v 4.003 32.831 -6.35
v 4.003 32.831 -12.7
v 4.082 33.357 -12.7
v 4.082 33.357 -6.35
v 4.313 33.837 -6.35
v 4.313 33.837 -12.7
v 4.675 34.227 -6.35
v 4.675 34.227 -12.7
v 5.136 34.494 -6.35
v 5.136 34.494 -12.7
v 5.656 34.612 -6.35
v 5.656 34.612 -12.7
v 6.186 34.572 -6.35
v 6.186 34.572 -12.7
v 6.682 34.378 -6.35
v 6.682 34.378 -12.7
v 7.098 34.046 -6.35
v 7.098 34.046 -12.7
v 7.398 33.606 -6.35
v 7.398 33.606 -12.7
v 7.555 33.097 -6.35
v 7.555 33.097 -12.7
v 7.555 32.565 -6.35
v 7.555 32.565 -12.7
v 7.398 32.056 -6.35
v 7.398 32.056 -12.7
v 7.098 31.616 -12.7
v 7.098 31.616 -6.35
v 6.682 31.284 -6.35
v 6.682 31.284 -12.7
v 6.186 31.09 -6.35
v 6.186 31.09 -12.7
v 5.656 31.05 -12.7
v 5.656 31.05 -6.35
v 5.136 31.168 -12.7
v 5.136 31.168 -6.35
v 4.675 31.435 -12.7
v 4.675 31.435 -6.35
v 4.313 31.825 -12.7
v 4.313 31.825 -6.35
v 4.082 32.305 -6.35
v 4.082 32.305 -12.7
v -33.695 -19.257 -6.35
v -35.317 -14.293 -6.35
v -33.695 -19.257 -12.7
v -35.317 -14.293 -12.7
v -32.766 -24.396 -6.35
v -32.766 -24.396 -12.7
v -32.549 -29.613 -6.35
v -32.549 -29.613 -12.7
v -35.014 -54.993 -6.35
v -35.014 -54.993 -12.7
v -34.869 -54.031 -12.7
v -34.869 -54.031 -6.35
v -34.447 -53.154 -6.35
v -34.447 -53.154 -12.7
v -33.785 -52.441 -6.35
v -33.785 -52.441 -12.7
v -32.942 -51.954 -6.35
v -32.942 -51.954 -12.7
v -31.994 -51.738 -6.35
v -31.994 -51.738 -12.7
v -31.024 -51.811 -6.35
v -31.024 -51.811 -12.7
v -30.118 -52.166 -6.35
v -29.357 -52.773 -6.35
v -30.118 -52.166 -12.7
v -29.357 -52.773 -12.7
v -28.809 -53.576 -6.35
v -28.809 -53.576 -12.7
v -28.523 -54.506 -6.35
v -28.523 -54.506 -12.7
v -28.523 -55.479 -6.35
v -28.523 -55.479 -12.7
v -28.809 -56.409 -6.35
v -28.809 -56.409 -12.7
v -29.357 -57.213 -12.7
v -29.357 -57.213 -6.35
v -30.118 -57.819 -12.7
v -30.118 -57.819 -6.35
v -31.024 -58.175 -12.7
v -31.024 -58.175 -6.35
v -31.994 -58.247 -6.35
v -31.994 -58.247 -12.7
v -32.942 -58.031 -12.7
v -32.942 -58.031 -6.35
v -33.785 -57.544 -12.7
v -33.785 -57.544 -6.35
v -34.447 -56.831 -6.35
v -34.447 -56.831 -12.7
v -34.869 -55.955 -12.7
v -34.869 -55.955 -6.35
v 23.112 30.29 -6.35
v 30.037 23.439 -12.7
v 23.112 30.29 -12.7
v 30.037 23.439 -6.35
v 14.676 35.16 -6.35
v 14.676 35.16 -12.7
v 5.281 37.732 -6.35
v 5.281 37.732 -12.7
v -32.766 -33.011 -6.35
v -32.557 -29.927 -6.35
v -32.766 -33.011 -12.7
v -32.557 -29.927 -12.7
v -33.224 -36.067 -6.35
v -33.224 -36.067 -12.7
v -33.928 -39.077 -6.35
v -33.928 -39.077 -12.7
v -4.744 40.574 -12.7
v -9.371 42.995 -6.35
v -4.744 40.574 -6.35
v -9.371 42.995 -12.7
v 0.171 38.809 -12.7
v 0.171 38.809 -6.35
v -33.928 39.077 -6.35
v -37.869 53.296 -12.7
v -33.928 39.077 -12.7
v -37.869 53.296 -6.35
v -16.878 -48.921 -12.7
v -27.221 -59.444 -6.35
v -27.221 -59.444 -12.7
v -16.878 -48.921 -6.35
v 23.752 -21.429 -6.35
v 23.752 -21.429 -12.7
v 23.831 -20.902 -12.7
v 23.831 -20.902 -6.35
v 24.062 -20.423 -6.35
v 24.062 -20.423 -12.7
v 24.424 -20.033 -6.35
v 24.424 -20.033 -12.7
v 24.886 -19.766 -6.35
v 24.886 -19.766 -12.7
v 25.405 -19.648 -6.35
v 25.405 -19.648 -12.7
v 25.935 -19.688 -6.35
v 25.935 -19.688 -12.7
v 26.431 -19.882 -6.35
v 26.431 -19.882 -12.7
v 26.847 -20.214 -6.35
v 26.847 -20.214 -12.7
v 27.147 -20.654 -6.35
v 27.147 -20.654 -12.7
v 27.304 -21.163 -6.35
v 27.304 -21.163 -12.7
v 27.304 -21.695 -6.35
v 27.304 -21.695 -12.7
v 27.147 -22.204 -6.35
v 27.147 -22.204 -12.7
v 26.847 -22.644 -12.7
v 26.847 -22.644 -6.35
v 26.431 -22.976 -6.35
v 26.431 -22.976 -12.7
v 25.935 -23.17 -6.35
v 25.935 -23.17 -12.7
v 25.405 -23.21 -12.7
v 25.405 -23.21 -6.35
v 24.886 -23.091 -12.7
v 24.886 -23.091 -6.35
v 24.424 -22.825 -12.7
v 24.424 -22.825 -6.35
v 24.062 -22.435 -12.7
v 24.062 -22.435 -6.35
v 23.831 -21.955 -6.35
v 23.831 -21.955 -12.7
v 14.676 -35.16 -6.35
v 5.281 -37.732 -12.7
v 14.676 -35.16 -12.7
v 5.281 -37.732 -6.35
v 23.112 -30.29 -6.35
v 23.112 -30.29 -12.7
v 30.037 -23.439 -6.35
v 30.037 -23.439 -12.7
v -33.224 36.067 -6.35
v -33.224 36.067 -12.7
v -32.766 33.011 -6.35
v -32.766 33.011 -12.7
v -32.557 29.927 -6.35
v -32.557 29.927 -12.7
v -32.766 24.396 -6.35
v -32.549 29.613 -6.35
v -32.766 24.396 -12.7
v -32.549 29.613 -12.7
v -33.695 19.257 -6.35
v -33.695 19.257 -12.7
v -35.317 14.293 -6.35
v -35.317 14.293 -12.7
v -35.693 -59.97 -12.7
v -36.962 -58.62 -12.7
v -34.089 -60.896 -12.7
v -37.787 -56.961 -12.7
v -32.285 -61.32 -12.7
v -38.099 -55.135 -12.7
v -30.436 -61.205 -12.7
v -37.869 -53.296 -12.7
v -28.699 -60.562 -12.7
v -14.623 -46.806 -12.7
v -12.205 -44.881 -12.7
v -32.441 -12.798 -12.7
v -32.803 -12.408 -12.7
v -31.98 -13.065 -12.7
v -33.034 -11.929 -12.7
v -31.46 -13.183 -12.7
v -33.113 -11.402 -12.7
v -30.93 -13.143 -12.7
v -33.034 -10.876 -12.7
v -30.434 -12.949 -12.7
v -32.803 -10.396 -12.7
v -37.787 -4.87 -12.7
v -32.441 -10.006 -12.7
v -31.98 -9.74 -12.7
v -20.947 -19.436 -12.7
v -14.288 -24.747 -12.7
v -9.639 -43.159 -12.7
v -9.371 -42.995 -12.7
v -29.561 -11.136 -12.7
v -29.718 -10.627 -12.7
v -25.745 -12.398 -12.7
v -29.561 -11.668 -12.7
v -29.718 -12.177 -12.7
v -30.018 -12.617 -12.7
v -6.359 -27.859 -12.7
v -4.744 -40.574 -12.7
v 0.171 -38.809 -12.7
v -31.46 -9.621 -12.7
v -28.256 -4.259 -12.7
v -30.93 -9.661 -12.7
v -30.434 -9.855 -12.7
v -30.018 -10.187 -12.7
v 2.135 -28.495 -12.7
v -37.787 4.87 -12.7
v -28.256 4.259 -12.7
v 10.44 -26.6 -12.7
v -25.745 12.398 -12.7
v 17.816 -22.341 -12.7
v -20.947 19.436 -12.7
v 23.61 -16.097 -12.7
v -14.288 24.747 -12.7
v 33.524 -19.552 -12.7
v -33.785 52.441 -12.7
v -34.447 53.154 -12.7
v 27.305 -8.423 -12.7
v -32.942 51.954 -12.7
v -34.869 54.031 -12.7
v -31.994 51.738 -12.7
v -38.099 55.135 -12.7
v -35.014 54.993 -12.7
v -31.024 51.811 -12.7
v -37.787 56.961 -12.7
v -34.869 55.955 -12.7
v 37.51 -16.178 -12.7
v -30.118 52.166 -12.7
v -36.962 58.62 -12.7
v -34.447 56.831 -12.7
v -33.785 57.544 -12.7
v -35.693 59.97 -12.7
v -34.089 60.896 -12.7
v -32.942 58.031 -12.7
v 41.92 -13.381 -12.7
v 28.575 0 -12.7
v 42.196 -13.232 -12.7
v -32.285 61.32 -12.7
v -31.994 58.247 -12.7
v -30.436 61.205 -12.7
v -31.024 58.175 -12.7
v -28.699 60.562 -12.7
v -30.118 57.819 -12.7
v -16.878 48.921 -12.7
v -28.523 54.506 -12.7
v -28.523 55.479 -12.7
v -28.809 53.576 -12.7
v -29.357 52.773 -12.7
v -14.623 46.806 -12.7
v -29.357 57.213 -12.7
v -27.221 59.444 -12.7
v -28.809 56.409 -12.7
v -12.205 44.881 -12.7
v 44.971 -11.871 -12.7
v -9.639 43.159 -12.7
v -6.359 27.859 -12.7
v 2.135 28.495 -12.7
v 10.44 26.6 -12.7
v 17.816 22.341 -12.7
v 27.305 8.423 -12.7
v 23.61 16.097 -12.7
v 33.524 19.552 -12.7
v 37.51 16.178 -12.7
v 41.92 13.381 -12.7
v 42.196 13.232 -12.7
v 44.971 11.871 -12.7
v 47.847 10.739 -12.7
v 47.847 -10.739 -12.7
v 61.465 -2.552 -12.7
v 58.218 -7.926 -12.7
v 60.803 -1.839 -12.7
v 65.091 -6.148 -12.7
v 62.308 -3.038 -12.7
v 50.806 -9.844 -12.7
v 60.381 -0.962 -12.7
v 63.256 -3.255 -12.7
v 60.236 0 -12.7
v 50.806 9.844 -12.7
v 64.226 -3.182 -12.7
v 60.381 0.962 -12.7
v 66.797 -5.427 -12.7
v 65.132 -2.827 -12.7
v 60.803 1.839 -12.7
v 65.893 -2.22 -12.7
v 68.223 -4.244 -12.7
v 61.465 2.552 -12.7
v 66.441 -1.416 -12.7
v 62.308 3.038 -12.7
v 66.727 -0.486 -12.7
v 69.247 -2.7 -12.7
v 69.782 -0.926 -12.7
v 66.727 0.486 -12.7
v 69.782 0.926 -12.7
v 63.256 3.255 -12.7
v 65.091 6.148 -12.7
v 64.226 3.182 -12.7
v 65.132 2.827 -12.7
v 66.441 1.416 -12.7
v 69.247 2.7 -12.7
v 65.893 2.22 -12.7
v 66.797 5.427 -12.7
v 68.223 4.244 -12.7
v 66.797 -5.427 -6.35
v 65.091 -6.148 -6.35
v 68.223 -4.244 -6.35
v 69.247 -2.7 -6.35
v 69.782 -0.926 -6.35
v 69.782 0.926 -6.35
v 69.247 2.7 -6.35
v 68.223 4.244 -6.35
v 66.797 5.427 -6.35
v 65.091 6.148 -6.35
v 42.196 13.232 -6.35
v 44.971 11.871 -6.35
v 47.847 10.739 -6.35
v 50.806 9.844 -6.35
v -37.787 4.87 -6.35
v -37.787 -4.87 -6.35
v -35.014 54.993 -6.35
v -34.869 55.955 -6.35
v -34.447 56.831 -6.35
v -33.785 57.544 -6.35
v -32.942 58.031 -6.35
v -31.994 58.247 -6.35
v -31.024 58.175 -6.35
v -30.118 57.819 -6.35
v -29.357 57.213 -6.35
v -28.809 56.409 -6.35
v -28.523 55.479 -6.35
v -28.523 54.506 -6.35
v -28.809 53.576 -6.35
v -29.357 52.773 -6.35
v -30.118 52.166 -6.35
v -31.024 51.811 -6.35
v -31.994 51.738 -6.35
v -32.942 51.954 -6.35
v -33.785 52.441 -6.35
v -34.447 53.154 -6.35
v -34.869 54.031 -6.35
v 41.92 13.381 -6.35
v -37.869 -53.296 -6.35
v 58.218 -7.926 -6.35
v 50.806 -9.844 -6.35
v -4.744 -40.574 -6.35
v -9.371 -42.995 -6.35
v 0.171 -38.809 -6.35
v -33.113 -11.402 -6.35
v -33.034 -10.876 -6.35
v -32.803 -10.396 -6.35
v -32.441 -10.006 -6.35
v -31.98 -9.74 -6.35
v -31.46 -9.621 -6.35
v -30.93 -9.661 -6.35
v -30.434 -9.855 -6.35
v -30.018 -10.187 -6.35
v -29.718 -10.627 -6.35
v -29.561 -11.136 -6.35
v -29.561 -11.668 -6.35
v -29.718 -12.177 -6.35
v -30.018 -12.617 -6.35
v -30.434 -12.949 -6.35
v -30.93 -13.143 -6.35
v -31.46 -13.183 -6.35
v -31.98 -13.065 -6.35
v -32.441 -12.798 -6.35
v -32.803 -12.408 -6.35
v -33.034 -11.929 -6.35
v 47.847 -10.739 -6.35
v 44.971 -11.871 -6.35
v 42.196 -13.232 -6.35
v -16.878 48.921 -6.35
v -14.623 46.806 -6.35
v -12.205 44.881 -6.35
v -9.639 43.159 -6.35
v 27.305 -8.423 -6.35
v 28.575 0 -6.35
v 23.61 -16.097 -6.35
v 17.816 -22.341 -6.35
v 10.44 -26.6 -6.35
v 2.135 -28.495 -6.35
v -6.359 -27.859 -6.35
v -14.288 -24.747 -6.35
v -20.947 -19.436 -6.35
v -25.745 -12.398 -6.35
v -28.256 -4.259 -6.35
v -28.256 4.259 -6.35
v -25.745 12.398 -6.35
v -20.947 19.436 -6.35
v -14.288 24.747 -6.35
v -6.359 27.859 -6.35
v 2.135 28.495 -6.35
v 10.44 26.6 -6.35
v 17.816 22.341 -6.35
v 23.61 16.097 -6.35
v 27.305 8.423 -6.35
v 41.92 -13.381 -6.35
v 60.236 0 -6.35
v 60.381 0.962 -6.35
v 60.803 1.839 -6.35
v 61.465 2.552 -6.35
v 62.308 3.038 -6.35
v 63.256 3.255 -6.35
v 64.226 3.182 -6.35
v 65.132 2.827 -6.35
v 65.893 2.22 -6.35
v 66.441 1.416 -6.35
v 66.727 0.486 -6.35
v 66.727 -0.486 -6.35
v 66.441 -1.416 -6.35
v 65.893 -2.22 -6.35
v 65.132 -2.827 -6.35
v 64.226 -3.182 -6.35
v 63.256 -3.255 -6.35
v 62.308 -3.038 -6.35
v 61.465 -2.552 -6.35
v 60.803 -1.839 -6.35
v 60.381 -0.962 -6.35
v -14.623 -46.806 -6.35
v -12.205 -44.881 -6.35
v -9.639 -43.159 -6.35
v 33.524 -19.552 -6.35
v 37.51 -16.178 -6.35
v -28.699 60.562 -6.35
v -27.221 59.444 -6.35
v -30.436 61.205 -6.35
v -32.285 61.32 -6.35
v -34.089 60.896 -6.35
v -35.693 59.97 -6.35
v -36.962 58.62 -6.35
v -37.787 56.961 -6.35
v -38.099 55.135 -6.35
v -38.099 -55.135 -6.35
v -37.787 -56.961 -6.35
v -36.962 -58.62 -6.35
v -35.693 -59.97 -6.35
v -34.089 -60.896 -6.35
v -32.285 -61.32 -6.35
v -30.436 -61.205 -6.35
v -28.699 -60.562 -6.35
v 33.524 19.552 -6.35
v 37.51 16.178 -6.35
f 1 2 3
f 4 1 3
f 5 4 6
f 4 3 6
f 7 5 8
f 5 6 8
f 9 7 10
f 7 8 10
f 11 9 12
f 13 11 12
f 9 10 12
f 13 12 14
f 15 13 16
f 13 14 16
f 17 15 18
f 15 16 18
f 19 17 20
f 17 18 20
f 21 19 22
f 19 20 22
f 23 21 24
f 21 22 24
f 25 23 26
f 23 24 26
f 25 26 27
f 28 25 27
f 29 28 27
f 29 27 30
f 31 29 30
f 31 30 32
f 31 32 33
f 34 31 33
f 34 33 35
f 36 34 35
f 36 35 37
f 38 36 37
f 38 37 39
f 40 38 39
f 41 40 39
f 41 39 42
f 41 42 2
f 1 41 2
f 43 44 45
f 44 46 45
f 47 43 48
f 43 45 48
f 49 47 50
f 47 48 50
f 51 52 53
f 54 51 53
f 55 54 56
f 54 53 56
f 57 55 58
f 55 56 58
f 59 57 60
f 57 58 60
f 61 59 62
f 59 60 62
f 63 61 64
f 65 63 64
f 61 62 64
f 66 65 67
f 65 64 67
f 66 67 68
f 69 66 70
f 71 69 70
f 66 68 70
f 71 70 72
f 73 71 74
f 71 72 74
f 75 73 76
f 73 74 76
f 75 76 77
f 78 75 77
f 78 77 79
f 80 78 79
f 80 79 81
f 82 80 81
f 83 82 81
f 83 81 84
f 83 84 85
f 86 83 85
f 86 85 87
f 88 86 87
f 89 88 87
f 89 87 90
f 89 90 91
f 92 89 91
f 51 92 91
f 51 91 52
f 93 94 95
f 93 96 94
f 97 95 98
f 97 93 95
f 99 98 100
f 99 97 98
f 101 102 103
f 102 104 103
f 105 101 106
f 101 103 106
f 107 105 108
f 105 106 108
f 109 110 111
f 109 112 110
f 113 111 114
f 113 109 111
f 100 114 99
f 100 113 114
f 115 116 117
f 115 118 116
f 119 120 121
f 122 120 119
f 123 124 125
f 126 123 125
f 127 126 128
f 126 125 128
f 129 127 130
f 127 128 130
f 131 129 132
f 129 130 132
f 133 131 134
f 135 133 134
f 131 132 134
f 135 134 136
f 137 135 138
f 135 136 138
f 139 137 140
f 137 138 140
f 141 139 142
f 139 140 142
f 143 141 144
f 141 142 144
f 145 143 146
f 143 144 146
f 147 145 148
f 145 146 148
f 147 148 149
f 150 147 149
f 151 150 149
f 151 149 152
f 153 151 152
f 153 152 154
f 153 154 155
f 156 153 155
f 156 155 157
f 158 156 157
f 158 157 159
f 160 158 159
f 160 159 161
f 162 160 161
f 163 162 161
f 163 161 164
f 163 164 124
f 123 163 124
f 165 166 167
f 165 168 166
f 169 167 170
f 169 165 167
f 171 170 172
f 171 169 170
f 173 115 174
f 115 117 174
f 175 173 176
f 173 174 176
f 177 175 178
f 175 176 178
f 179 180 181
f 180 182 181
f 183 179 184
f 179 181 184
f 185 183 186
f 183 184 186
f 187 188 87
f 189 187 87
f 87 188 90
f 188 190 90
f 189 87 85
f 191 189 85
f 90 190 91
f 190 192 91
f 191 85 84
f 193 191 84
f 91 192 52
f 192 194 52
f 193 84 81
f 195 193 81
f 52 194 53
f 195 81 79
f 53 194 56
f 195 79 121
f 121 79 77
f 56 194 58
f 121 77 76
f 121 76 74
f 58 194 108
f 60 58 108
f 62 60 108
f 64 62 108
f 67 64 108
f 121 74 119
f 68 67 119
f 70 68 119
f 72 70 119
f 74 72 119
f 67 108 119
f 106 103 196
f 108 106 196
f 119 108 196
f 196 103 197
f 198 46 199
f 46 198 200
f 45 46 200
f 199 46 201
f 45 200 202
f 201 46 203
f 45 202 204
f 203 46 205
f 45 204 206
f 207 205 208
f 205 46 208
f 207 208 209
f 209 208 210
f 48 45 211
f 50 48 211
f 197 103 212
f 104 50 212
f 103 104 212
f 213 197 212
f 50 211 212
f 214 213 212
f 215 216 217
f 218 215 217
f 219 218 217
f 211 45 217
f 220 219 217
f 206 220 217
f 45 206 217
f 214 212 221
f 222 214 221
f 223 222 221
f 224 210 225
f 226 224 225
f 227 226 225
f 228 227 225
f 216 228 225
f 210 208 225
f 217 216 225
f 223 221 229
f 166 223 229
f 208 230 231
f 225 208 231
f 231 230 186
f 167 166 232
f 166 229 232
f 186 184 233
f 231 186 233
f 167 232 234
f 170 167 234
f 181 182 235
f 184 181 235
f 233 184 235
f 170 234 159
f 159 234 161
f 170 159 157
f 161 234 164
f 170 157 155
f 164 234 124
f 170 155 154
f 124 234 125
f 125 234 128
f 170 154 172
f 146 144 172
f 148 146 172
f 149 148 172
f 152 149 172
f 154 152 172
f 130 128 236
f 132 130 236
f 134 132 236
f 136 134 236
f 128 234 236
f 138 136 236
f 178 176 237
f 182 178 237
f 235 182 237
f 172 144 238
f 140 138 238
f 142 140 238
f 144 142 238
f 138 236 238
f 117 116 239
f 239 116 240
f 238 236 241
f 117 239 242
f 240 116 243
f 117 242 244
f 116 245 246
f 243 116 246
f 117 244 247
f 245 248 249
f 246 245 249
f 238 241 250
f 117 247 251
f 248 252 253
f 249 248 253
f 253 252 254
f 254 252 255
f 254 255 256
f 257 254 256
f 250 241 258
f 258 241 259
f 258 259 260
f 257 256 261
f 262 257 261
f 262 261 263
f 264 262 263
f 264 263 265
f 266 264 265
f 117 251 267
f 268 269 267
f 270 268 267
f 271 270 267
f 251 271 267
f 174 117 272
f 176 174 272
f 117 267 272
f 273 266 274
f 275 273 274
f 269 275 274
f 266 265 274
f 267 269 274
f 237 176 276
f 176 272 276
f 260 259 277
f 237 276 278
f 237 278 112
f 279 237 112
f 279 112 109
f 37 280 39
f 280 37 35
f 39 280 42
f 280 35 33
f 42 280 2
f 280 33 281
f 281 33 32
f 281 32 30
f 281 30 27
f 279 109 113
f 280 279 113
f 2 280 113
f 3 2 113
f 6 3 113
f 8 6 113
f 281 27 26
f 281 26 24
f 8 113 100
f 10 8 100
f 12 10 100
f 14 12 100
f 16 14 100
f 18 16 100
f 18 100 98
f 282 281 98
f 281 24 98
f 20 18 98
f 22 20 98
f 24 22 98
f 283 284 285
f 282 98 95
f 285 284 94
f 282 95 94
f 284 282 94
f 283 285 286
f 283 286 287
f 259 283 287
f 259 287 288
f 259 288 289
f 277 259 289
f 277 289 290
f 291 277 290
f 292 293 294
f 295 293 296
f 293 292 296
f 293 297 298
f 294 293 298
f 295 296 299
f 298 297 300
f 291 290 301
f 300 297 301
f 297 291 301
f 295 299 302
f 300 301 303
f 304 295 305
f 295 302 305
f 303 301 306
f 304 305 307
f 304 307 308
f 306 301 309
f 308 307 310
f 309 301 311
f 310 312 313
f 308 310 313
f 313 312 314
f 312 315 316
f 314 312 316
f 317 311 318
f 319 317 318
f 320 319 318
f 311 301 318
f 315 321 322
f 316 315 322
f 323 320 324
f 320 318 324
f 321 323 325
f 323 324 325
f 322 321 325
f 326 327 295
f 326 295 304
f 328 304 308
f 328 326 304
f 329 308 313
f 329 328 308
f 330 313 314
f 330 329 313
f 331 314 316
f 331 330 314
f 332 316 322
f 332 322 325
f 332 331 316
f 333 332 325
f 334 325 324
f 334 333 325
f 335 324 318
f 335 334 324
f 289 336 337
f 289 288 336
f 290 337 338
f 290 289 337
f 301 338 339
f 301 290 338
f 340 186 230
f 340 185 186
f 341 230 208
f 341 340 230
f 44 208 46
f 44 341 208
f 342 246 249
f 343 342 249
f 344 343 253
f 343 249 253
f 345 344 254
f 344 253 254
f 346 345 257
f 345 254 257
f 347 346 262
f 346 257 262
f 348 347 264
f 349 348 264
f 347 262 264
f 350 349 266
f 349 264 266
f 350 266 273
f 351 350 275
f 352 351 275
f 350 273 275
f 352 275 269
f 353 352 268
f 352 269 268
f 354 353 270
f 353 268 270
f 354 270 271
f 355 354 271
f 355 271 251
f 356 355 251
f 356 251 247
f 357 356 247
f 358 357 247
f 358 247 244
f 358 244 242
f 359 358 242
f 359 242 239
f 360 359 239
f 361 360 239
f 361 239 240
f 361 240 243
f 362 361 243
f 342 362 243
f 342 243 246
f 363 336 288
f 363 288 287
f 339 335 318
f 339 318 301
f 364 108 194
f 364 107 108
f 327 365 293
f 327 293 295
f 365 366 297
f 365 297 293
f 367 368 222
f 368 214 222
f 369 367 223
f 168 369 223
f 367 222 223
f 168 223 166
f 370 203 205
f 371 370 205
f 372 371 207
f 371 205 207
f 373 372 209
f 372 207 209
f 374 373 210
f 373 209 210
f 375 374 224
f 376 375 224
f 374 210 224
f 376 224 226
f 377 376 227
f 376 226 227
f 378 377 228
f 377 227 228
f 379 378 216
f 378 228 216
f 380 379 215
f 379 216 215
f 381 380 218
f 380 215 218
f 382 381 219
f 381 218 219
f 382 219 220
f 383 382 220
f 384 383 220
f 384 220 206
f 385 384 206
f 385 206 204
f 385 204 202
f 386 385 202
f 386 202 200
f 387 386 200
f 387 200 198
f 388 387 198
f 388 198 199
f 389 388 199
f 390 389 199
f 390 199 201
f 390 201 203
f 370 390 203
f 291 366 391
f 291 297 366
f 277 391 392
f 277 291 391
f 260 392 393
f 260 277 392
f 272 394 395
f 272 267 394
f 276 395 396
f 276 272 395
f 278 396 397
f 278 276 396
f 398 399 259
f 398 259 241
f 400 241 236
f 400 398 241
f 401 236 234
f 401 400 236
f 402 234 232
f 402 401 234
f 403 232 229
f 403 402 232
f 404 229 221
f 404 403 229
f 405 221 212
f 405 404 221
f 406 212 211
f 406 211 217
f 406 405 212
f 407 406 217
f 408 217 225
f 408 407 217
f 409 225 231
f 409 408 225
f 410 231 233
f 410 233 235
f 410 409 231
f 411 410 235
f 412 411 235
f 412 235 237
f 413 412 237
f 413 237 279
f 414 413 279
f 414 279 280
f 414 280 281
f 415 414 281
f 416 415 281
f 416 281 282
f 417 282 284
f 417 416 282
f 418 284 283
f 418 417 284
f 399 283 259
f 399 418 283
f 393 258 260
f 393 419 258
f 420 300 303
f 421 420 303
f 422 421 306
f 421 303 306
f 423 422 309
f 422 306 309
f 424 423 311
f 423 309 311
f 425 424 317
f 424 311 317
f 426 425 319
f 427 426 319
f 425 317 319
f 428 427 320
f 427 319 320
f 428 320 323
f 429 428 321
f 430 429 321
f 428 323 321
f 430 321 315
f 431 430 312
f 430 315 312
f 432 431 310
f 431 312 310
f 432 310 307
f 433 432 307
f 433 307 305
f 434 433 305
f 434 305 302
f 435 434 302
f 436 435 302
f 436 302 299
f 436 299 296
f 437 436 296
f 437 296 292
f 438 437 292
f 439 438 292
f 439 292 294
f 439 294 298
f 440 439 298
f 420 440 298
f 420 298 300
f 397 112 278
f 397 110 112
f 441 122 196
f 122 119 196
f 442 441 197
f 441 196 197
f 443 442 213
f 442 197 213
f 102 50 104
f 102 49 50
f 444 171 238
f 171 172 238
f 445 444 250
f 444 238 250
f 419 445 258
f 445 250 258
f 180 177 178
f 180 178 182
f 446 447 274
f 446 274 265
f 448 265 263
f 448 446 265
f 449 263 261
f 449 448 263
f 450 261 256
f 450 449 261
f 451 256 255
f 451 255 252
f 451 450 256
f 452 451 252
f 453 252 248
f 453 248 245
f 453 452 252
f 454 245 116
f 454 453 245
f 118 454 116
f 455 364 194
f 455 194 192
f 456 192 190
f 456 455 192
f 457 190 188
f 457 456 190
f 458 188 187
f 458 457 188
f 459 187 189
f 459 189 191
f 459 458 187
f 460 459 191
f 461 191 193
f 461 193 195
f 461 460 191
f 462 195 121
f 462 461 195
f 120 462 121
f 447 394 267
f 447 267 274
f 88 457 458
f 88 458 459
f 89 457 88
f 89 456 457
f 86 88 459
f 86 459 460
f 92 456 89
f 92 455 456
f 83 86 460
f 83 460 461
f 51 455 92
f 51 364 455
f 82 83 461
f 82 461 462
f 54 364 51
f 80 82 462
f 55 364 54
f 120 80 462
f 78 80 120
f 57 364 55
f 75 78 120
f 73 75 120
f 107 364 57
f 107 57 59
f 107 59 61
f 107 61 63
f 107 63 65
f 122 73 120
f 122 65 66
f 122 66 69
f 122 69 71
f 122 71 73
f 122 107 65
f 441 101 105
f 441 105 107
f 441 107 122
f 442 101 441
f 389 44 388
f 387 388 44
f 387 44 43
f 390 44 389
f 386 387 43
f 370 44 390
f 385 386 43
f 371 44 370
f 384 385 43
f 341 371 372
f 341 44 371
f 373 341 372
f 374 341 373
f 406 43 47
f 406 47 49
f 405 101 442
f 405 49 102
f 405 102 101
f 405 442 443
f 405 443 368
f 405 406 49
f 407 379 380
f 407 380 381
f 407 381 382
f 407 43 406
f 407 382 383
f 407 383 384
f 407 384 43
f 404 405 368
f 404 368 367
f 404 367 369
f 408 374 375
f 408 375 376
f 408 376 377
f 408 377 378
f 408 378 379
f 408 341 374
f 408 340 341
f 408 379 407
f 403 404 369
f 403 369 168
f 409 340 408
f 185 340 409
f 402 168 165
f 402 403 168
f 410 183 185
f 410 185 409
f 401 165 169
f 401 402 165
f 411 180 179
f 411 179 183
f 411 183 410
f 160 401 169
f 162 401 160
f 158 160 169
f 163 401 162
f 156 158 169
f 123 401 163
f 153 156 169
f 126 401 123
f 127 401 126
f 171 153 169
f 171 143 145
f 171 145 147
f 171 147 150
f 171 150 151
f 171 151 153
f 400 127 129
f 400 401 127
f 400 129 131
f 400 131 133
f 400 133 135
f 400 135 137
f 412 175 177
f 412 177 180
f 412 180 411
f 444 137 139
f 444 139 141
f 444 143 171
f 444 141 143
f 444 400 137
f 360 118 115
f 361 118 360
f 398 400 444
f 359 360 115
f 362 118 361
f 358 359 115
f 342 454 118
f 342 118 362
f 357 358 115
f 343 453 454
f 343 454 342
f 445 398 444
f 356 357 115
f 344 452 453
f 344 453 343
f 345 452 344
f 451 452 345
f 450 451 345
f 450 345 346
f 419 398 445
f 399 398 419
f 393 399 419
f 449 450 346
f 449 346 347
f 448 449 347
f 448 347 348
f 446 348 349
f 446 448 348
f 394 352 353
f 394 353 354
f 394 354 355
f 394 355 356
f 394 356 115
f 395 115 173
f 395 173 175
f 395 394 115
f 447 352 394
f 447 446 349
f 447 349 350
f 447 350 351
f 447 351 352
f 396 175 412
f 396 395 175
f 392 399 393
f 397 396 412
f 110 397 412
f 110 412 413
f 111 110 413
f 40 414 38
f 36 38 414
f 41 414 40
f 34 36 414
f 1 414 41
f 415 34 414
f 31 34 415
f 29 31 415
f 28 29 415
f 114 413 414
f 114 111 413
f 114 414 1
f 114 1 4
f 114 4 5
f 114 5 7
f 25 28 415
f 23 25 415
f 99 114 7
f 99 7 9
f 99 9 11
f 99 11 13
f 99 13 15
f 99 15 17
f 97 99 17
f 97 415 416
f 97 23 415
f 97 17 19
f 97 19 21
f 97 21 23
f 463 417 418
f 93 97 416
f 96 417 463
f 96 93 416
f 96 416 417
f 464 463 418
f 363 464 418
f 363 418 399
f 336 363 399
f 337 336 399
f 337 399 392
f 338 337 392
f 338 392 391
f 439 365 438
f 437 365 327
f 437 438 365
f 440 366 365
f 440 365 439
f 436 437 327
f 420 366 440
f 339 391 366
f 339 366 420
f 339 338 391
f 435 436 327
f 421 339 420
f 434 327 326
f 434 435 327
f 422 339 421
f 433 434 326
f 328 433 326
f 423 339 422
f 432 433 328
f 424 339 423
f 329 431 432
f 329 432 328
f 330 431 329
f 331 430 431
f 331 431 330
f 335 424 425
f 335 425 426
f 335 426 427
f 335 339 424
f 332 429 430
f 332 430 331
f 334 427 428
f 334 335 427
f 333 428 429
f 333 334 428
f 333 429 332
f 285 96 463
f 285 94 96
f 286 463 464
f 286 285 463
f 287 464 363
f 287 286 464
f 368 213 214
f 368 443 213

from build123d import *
from build123d.topology import SkipClean

# Parameters (mm, degrees)
BOSS_EXTRUDE1_DEPTH      = 6.35
BOSS_EXTRUDE1_DEPTH_BACK = 6.35
BOSS_EXTRUDE2_START      = -12.7
BOSS_EXTRUDE2_DEPTH      = 12.7
SKETCH4_R                = 28.575
CUT_EXTRUDE1_DEPTH       = 61.157662646
SKETCH5_R                = 28.575
BOSS_EXTRUDE3_DEPTH      = 6.35
F_0_257_DIAMETER_HOLE1_D = 6.5278
CUT_EXTRUDE2_DEPTH       = 94.825678832
CUT_EXTRUDE2_DEPTH_BACK  = 94.825678832
SKETCH8_W                = 12.7
SKETCH8_H                = 88.9
FILLET3_R                = 38.1
SKETCH10_R               = 1.786001
CUT_EXTRUDE4_DEPTH       = 94.17880933


with BuildPart() as part:
    # Sketch1 → Boss-Extrude1 (new, two sides: drawn at the far end of the back side and taken through both)
    with BuildSketch(Plane.XY.offset(-BOSS_EXTRUDE1_DEPTH_BACK)):
        with BuildLine():
            Line((27.49630657, 15.875), (38.494829198, 22.225))
            ThreePointArc((38.494829198, 22.225), (19.878280804, 29.537115412), (0, 31.75))
            Line((0, 31.75), (0, 44.45))
            ThreePointArc((0, 44.45), (-15.640751899, 31.983653865), (-27.49630657, 15.875))
            Line((-27.49630657, 15.875), (-38.494829198, 22.225))
            ThreePointArc((-38.494829198, 22.225), (-35.519032703, 2.446538454), (-27.49630657, -15.875))
            Line((-27.49630657, -15.875), (-38.494829198, -22.225))
            ThreePointArc((-38.494829198, -22.225), (-19.878280804, -29.537115412), (0, -31.75))
            Line((0, -31.75), (0, -44.45))
            ThreePointArc((0, -44.45), (15.640751899, -31.983653865), (27.49630657, -15.875))
            Line((27.49630657, -15.875), (38.494829198, -22.225))
            ThreePointArc((38.494829198, -22.225), (35.519032703, -2.446538454), (27.49630657, 15.875))
        make_face()
        with BuildLine():
            ThreePointArc((-11.129967969, 17.779280801), (-16.817028225, 8.924127912), (-20.962292819, -0.749194604))
            ThreePointArc((-20.962292819, -0.749194604), (-16.137035591, -10.101909703), (-9.83232485, -18.528475405))
            ThreePointArc((-9.83232485, -18.528475405), (0.679992634, -19.026037615), (11.129967969, -17.779280801))
            ThreePointArc((11.129967969, -17.779280801), (16.817028225, -8.924127912), (20.962292819, 0.749194604))
            ThreePointArc((20.962292819, 0.749194604), (16.137035591, 10.101909703), (9.83232485, 18.528475405))
            ThreePointArc((9.83232485, 18.528475405), (-0.679992634, 19.026037615), (-11.129967969, 17.779280801))
        make_face(mode=Mode.SUBTRACT)
    extrude(amount=BOSS_EXTRUDE1_DEPTH + BOSS_EXTRUDE1_DEPTH_BACK)

    # Sketch3 → Boss-Extrude2 (add)
    with BuildSketch(Plane.XY.offset(6.35).offset(BOSS_EXTRUDE2_START)):
        with BuildLine():
            ThreePointArc((-11.129967969, 17.779280801), (-16.817028225, 8.924127912), (-20.962292819, -0.749194604))
            ThreePointArc((-20.962292819, -0.749194604), (-16.137035591, -10.101909703), (-9.83232485, -18.528475405))
            ThreePointArc((-9.83232485, -18.528475405), (0.679992634, -19.026037615), (11.129967969, -17.779280801))
            ThreePointArc((11.129967969, -17.779280801), (16.817028225, -8.924127912), (20.962292819, 0.749194604))
            ThreePointArc((20.962292819, 0.749194604), (16.137035591, 10.101909703), (9.83232485, 18.528475405))
            ThreePointArc((9.83232485, 18.528475405), (-0.679992634, 19.026037615), (-11.129967969, 17.779280801))
        make_face()
    extrude(amount=BOSS_EXTRUDE2_DEPTH)

    # Sketch4 → Cut-Extrude1 (cut, through all)
    with BuildSketch(Plane.XY.offset(6.35)):
        Circle(SKETCH4_R)
    extrude(amount=-CUT_EXTRUDE1_DEPTH, mode=Mode.SUBTRACT)

    # Sketch5 → Boss-Extrude3 (add)
    with SkipClean():  # the faces are left unmerged after this step: merging them gives an invalid solid
        with BuildSketch(Plane(origin=(0, 0, -6.35), x_dir=(-1, 0, 0), z_dir=(0, 0, -1))):
            with BuildLine():
                Line((-46.293490064, -11.011328104), (-58.217602687, -7.926026976))
                Line((-58.217602687, -7.926026976), (-65.090673557, -6.147656209))
                ThreePointArc((-65.090673557, -6.147656209), (-69.850111749, 0), (-65.090673557, 6.147656209))
                Line((-65.090673557, 6.147656209), (-46.293490064, 11.011328104))
                Line((-46.293490064, 11.011328104), (-33.653938233, 17.861199328))
                ThreePointArc((-33.653938233, 17.861199328), (-19.05, 32.995567884), (1.358716756, 38.075765111))
                Line((1.358716756, 38.075765111), (13.610655164, 45.597002477))
                Line((13.610655164, 45.597002477), (27.221310328, 59.444004954))
                ThreePointArc((27.221310328, 59.444004954), (34.925055875, 60.491971232), (37.869363229, 53.296348745))
                Line((37.869363229, 53.296348745), (32.6828349, 34.585674373))
                Line((32.6828349, 34.585674373), (32.295221476, 20.214565783))
                ThreePointArc((32.295221476, 20.214565783), (38.1, 0), (32.295221476, -20.214565783))
                Line((32.295221476, -20.214565783), (32.6828349, -34.585674373))
                Line((32.6828349, -34.585674373), (37.869363229, -53.296348745))
                ThreePointArc((37.869363229, -53.296348745), (34.925055875, -60.491971232), (27.221310328, -59.444004954))
                Line((27.221310328, -59.444004954), (13.610655164, -45.597002477))
                Line((13.610655164, -45.597002477), (1.358716756, -38.075765111))
                ThreePointArc((1.358716756, -38.075765111), (-19.05, -32.995567884), (-33.653938233, -17.861199328))
                Line((-33.653938233, -17.861199328), (-46.293490064, -11.011328104))
            make_face()
            Circle(SKETCH5_R, mode=Mode.SUBTRACT)
        extrude(amount=BOSS_EXTRUDE3_DEPTH)

    # F (0.257) Diameter Hole1 (through all)
    with Locations(Plane.XY.offset(-6.35)):
        with Locations((-31.75, 54.99261314), (63.5, 0), (-31.75, -54.99261314), (0, 0)):
            Hole(F_0_257_DIAMETER_HOLE1_D / 2)

    # Sketch8 → Cut-Extrude2 (cut, two sides: drawn at the far end of the back side and taken through both)
    with BuildSketch(Plane(origin=(0, 0, 0), x_dir=(0, 0, -1), z_dir=(1, 0, 0)).offset(-CUT_EXTRUDE2_DEPTH_BACK)):
        Rectangle(SKETCH8_W, SKETCH8_H)
    extrude(amount=CUT_EXTRUDE2_DEPTH + CUT_EXTRUDE2_DEPTH_BACK, mode=Mode.SUBTRACT)

    # Fillet3
    fillet3_edges = [part.edges().sort_by_distance(p)[0] for p in [
        (-13.610655164, -45.597002477, -9.525),
        (-1.358716756, -38.075765111, -9.525),
        (33.653938233, -17.861199328, -9.525),
        (46.293490064, -11.011328104, -9.525),
        (46.293490064, 11.011328104, -9.525),
        (33.653938233, 17.861199328, -9.525),
        (-1.358716756, 38.075765111, -9.525),
        (-13.610655164, 45.597002477, -9.525),
        (-32.6828349, 34.585674373, -9.525),
        (-32.295221476, 20.214565783, -9.525),
        (-32.295221476, -20.214565783, -9.525),
        (-32.6828349, -34.585674373, -9.525),
    ]]
    fillet(fillet3_edges, radius=FILLET3_R)

    # Sketch10 → Cut-Extrude4 (cut, through all)
    with BuildSketch(Plane(origin=(0, 0, -12.7), x_dir=(-1, 0, 0), z_dir=(0, 0, -1))):
        with Locations((-5.788996123, 32.831028466)):
            Circle(SKETCH10_R)
        with Locations((31.327002745, -11.402096528)):
            Circle(SKETCH10_R)
        with Locations((-25.538006622, -21.428931938)):
            Circle(SKETCH10_R)
    extrude(amount=-CUT_EXTRUDE4_DEPTH, mode=Mode.SUBTRACT)


solid = part.part
